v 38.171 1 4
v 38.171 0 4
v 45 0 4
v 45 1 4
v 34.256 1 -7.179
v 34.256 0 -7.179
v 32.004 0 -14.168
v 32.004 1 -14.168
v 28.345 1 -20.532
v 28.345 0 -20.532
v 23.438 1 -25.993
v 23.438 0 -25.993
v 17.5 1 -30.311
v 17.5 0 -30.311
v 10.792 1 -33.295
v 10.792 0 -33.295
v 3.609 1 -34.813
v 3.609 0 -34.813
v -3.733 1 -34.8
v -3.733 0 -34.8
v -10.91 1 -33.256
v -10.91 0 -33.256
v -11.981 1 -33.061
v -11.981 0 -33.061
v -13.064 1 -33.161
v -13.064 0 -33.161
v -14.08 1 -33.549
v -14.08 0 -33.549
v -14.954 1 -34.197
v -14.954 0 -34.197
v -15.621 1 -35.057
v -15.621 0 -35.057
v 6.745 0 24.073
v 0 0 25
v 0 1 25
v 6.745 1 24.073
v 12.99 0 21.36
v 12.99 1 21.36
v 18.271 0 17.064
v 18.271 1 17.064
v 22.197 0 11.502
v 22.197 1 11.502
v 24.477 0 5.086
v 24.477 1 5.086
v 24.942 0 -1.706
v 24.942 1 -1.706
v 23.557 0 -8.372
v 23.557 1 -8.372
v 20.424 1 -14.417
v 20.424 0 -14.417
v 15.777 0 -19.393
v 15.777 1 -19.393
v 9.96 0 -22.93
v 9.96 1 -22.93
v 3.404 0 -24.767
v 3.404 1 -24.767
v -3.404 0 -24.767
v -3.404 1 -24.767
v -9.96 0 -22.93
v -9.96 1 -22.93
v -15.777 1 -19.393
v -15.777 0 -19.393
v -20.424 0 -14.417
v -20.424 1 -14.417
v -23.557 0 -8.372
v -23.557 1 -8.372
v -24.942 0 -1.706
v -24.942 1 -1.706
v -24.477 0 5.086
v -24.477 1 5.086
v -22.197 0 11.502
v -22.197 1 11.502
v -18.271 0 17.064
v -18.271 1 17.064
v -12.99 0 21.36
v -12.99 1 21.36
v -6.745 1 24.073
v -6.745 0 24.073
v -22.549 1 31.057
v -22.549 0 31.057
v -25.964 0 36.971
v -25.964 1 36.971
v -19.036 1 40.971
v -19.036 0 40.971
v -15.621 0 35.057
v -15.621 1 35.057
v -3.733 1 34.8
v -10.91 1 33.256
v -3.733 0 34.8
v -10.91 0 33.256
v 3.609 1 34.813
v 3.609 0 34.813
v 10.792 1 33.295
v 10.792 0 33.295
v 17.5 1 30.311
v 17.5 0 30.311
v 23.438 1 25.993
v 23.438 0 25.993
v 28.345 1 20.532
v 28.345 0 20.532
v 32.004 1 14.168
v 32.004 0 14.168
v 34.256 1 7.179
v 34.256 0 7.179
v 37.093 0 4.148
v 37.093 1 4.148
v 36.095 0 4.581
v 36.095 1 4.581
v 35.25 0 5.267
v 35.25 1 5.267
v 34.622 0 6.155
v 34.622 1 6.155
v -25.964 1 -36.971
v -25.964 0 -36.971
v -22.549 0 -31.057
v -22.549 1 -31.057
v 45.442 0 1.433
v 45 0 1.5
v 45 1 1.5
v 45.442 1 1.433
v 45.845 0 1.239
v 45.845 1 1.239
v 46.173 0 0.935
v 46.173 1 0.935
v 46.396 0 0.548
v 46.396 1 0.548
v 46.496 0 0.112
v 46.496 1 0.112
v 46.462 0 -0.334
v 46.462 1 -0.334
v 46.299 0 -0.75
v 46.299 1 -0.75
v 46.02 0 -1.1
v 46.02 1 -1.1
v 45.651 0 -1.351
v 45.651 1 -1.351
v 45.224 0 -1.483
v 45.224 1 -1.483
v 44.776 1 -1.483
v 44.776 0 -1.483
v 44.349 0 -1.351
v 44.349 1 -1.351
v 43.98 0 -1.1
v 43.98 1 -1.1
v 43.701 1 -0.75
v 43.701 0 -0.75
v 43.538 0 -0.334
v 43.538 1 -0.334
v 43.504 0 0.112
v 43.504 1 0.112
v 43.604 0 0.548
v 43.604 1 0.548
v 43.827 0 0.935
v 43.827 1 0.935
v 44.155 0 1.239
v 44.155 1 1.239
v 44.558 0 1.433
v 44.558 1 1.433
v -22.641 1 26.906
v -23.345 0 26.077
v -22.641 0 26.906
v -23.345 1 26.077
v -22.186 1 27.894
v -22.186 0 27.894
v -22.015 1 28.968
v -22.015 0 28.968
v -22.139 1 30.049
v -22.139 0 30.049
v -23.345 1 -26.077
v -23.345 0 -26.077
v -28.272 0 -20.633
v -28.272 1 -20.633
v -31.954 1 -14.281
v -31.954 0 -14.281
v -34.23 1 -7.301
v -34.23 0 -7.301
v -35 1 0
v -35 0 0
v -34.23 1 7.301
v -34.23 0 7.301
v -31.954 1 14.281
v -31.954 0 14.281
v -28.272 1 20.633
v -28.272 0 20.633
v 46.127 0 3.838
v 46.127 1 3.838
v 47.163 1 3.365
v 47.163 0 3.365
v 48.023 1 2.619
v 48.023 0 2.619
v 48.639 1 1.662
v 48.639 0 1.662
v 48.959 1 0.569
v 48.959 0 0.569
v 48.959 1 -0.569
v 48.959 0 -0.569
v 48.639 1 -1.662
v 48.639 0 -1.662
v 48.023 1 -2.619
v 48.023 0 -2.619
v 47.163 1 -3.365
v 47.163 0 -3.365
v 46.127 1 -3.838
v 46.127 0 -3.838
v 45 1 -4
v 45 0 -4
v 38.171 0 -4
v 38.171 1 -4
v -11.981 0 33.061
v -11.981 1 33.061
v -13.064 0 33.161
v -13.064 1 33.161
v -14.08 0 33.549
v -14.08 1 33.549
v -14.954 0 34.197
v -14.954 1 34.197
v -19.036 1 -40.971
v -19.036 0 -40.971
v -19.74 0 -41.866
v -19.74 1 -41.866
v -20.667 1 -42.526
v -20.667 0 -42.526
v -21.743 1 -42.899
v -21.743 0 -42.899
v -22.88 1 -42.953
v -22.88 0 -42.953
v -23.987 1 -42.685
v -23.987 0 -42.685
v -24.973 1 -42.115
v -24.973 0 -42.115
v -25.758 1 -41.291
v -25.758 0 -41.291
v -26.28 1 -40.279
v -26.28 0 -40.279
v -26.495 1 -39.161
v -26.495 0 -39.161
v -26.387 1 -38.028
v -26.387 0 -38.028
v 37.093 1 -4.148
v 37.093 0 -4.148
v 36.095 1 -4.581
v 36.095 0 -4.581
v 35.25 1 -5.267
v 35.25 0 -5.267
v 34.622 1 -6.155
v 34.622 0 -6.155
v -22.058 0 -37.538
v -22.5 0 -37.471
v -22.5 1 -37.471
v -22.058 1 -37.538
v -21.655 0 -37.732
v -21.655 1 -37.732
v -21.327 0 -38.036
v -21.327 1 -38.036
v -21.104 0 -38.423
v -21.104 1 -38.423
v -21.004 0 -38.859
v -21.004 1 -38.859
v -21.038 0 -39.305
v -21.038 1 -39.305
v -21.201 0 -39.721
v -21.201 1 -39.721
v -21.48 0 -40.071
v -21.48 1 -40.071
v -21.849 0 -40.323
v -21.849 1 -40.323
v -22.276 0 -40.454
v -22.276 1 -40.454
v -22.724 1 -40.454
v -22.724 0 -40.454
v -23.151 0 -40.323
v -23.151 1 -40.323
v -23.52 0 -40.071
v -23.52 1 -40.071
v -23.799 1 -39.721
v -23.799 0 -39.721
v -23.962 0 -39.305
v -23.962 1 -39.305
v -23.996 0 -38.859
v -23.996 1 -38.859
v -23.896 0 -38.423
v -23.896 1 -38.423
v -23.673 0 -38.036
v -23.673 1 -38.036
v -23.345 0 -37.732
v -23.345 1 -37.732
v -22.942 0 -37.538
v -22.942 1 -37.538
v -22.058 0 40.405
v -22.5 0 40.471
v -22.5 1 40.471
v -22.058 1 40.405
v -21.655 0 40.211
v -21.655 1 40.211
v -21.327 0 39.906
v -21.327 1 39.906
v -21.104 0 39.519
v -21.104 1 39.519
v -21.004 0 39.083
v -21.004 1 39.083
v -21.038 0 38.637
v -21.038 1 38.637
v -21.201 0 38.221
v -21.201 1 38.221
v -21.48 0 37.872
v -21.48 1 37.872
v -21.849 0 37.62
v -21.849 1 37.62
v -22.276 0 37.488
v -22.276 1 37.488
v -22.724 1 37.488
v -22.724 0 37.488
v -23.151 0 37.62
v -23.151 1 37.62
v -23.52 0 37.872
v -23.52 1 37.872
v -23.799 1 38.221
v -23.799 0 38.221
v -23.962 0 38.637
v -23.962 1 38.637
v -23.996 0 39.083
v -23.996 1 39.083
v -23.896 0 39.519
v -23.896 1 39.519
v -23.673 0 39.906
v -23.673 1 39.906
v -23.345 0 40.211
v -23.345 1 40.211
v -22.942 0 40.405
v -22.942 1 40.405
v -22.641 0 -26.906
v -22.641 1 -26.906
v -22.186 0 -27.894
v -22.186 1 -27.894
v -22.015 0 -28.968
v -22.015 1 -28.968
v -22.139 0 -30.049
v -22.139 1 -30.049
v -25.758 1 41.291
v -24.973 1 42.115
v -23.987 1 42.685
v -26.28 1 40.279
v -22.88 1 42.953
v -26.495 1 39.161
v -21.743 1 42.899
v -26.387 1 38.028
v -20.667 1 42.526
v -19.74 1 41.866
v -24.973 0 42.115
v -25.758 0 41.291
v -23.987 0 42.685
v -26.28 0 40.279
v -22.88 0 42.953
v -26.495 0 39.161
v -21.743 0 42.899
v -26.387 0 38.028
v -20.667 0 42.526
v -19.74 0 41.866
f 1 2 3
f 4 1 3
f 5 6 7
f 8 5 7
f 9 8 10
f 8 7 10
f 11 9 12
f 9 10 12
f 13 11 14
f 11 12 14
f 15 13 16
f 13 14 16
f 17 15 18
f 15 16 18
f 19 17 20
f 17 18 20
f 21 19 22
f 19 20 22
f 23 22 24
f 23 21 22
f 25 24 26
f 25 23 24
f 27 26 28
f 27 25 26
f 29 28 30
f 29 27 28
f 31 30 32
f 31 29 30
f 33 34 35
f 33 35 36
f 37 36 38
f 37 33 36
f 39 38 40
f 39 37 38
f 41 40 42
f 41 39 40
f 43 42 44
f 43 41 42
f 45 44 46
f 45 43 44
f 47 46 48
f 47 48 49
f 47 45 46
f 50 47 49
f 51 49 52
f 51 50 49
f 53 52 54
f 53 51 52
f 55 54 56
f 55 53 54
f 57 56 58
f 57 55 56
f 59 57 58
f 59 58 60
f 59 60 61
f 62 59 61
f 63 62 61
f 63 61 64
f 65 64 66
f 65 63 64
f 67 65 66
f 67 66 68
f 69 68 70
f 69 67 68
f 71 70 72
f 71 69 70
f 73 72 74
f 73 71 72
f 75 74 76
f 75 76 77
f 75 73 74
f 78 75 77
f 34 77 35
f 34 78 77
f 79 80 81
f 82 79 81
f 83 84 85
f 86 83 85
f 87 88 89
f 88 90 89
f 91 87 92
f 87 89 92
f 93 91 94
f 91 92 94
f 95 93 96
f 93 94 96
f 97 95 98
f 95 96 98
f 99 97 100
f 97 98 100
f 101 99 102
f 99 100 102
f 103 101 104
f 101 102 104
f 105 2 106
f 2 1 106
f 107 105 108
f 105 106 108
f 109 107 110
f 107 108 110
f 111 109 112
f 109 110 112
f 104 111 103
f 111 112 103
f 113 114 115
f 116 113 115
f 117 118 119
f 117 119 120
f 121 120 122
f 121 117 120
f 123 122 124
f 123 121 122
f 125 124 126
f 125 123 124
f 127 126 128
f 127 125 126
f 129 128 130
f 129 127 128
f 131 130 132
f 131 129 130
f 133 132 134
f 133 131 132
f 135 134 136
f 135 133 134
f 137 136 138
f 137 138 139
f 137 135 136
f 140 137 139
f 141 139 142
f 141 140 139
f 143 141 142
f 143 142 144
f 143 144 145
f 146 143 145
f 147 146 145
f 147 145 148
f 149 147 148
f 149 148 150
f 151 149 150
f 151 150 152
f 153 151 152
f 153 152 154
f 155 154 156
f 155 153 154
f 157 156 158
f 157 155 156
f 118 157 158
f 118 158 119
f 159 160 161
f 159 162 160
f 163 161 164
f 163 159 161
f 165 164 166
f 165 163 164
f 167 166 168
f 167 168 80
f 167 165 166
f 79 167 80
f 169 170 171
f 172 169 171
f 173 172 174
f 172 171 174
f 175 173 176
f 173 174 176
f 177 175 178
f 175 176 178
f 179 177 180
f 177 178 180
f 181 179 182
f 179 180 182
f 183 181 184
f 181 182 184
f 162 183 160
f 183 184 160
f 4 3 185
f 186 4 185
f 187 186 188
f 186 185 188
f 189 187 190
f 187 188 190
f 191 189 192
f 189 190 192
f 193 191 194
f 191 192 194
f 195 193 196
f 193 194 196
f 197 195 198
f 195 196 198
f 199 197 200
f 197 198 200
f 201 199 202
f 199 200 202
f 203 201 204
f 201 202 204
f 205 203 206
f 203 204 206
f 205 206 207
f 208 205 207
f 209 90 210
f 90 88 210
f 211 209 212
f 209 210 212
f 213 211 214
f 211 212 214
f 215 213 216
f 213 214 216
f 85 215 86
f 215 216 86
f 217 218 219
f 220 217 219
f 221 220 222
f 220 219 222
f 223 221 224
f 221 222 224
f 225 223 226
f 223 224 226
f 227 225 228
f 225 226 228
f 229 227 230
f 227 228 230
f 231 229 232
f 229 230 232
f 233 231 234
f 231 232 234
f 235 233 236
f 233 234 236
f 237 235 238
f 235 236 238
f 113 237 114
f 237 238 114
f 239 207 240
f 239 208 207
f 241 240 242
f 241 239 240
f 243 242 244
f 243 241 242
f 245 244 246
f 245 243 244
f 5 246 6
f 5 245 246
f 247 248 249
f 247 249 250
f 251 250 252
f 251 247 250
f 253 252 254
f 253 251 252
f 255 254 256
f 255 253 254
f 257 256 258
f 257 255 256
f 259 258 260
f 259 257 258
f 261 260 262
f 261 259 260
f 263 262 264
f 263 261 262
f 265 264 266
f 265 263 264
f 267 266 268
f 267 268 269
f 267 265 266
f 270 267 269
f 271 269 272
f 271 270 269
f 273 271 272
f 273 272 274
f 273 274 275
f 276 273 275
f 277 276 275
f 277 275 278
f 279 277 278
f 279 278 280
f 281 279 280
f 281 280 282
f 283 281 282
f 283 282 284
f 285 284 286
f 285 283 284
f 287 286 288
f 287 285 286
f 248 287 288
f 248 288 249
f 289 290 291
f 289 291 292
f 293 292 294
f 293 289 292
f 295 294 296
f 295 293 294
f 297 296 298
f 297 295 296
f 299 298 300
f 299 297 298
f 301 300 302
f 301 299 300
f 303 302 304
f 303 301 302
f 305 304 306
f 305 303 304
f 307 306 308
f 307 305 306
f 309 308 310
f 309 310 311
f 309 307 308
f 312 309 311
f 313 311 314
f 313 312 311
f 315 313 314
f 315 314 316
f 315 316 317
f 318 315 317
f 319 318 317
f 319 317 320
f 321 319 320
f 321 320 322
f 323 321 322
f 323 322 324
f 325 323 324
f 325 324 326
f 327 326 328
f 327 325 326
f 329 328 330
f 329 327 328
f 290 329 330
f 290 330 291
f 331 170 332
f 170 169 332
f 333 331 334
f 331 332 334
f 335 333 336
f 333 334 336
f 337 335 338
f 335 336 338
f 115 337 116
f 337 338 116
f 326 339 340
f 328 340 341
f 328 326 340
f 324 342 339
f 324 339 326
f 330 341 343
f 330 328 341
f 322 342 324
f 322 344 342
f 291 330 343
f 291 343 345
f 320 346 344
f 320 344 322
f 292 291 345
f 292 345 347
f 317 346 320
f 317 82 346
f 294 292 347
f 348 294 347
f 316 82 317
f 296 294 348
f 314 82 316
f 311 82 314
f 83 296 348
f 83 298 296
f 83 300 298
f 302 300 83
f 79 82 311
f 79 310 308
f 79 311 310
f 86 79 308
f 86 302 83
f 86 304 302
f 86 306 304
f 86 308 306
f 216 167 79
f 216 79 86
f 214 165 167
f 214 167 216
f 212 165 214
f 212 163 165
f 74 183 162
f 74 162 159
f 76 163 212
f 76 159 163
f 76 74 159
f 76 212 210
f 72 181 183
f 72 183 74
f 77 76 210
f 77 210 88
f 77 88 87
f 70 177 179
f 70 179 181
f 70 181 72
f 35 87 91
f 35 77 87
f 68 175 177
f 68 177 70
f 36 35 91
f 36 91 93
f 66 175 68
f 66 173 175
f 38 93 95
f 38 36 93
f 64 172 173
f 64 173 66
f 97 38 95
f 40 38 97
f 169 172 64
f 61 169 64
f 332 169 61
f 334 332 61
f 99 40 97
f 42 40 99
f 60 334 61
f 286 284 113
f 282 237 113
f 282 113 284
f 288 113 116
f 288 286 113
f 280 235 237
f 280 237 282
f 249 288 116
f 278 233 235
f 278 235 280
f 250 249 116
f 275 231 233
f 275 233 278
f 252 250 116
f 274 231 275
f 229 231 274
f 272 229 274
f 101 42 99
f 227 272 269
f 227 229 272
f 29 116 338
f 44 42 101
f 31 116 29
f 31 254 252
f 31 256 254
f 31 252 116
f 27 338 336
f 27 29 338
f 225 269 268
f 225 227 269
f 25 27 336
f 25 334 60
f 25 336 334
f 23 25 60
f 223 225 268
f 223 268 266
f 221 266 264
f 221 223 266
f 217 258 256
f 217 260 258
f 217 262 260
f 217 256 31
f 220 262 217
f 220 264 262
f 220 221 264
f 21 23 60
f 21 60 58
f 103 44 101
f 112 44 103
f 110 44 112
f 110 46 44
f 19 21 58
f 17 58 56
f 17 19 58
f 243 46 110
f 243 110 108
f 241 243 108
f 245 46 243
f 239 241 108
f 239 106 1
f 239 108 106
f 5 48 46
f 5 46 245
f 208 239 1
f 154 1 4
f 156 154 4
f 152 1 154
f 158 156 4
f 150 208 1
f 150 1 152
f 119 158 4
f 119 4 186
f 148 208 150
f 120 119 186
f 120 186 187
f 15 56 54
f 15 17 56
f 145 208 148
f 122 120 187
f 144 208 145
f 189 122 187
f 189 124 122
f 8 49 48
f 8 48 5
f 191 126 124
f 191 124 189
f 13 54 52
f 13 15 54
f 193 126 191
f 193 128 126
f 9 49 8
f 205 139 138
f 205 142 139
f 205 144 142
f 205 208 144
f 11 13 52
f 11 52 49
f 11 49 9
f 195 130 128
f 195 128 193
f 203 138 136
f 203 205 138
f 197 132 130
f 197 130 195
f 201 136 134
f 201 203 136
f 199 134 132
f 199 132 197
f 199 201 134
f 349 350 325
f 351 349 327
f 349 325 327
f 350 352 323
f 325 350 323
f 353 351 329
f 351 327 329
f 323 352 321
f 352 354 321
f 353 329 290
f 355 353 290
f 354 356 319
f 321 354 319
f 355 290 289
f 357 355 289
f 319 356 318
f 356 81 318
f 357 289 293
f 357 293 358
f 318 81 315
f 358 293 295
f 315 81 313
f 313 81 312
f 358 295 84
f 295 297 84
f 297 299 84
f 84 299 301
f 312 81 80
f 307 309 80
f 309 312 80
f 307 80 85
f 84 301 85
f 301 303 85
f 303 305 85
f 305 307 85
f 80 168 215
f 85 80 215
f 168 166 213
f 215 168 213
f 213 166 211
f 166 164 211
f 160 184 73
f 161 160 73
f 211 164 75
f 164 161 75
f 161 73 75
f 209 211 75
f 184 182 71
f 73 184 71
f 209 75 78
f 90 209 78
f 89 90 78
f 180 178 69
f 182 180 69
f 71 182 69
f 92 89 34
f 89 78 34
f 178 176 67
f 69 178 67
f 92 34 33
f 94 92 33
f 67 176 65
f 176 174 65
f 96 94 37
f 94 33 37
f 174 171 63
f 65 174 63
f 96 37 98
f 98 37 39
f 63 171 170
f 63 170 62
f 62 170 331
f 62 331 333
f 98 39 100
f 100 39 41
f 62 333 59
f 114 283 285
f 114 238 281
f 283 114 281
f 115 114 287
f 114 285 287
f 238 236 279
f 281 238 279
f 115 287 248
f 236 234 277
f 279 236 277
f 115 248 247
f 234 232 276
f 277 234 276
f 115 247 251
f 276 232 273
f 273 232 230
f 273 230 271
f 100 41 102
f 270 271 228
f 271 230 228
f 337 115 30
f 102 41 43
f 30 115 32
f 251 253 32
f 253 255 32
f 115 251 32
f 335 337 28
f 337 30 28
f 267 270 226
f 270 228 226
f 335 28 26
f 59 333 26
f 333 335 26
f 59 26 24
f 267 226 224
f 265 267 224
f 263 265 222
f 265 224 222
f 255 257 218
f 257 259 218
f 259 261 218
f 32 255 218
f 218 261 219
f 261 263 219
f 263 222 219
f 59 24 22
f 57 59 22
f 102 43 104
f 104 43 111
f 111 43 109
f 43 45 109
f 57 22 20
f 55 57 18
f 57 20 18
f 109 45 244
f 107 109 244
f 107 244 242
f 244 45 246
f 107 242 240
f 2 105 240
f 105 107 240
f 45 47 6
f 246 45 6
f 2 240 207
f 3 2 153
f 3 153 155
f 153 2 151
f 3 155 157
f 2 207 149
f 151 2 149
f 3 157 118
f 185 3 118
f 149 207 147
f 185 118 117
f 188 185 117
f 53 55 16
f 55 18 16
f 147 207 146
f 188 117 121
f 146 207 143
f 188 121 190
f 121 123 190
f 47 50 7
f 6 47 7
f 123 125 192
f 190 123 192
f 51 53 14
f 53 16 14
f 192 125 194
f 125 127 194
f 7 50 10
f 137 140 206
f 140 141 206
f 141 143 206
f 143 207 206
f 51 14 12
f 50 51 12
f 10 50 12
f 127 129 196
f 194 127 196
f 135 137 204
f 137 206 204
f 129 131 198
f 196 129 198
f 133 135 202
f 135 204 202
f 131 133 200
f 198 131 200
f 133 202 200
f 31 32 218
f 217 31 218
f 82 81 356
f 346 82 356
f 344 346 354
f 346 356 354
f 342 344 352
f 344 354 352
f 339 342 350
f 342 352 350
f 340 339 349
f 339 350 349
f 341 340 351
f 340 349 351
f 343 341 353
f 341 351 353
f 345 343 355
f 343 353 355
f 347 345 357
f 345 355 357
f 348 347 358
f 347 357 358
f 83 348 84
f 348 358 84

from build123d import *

# Parameters (mm, degrees)
SKETCH1_R           = 35
SKETCH1_R_2         = 25
SKETCH1_R_3         = 1.5
BOSS_EXTRUDE1_DEPTH = 1
FILLET1_R           = 4


with BuildPart() as part:
    # Sketch1 → Boss-Extrude1 (new body)
    # profile 1 of 4: a face of its own
    with BuildSketch(Plane(origin=(0, 0, 0), x_dir=(1, 0, 0), z_dir=(0, 1, 0))):
        Circle(SKETCH1_R)
        with Locations(Location((0, 0, 0), (0, 0, 270))):
            Circle(SKETCH1_R_2, mode=Mode.SUBTRACT)
    # profile 2 of 4: a face of its own
    with BuildSketch(Plane(origin=(0, 0, 0), x_dir=(1, 0, 0), z_dir=(0, 1, 0))):
        with BuildLine():
            ThreePointArc((-20.849440266, 28.11228985), (-17.5, 30.310889132), (-13.921237036, 32.11228985))
            Line((-13.921237036, 32.11228985), (-19.035586192, 40.970602437))
            Line((-19.035586192, 40.970602437), (-19.035898385, 40.97114317))
            ThreePointArc((-19.035898385, 40.97114317), (-24.5, 42.435244785), (-25.964101615, 36.97114317))
            Line((-25.964101615, 36.97114317), (-20.849440266, 28.11228985))
        make_face()
        with Locations(Location((-22.5, 38.97114317, 0), (0, 0, 270))):
            Circle(SKETCH1_R_3, mode=Mode.SUBTRACT)
    # profile 3 of 4: a face of its own
    with BuildSketch(Plane(origin=(0, 0, 0), x_dir=(1, 0, 0), z_dir=(0, 1, 0))):
        with BuildLine():
            Line((-19.035898385, -40.97114317), (-13.921237036, -32.11228985))
            ThreePointArc((-13.921237036, -32.11228985), (-17.5, -30.310889132), (-20.849440266, -28.11228985))
            Line((-20.849440266, -28.11228985), (-25.963789422, -36.970602437))
            Line((-25.963789422, -36.970602437), (-25.964101615, -36.97114317))
            ThreePointArc((-25.964101615, -36.97114317), (-24.5, -42.435244785), (-19.035898385, -40.97114317))
        make_face()
        with Locations(Location((-22.5, -38.97114317, 0), (0, 0, 270))):
            Circle(SKETCH1_R_3, mode=Mode.SUBTRACT)
    # profile 4 of 4: a face of its own
    with BuildSketch(Plane(origin=(0, 0, 0), x_dir=(1, 0, 0), z_dir=(0, 1, 0))):
        with BuildLine():
            ThreePointArc((45, -4), (49, 0), (45, 4))
            Line((45, 4), (34.770677301, 4))
            ThreePointArc((34.770677301, 4), (34.942622294, 2.00328411), (35, 0))
            ThreePointArc((35, 0), (34.942622294, -2.00328411), (34.770677301, -4))
            Line((34.770677301, -4), (44.999375615, -4))
            Line((44.999375615, -4), (45, -4))
        make_face()
        with Locations(Location((45, 0, 0), (0, 0, 270))):
            Circle(SKETCH1_R_3, mode=Mode.SUBTRACT)
    extrude(amount=BOSS_EXTRUDE1_DEPTH)

    # Fillet1
    fillet1_edges = [part.edges().sort_by_distance(p)[0] for p in [
        (-13.921237036, 0.5, 32.11228985),
        (-20.849440266, 0.5, 28.11228985),
        (-20.849440266, 0.5, -28.11228985),
        (-13.921237036, 0.5, -32.11228985),
        (34.770677301, 0.5, -4),
        (34.770677301, 0.5, 4),
    ]]
    fillet(fillet1_edges, radius=FILLET1_R)


solid = part.part
